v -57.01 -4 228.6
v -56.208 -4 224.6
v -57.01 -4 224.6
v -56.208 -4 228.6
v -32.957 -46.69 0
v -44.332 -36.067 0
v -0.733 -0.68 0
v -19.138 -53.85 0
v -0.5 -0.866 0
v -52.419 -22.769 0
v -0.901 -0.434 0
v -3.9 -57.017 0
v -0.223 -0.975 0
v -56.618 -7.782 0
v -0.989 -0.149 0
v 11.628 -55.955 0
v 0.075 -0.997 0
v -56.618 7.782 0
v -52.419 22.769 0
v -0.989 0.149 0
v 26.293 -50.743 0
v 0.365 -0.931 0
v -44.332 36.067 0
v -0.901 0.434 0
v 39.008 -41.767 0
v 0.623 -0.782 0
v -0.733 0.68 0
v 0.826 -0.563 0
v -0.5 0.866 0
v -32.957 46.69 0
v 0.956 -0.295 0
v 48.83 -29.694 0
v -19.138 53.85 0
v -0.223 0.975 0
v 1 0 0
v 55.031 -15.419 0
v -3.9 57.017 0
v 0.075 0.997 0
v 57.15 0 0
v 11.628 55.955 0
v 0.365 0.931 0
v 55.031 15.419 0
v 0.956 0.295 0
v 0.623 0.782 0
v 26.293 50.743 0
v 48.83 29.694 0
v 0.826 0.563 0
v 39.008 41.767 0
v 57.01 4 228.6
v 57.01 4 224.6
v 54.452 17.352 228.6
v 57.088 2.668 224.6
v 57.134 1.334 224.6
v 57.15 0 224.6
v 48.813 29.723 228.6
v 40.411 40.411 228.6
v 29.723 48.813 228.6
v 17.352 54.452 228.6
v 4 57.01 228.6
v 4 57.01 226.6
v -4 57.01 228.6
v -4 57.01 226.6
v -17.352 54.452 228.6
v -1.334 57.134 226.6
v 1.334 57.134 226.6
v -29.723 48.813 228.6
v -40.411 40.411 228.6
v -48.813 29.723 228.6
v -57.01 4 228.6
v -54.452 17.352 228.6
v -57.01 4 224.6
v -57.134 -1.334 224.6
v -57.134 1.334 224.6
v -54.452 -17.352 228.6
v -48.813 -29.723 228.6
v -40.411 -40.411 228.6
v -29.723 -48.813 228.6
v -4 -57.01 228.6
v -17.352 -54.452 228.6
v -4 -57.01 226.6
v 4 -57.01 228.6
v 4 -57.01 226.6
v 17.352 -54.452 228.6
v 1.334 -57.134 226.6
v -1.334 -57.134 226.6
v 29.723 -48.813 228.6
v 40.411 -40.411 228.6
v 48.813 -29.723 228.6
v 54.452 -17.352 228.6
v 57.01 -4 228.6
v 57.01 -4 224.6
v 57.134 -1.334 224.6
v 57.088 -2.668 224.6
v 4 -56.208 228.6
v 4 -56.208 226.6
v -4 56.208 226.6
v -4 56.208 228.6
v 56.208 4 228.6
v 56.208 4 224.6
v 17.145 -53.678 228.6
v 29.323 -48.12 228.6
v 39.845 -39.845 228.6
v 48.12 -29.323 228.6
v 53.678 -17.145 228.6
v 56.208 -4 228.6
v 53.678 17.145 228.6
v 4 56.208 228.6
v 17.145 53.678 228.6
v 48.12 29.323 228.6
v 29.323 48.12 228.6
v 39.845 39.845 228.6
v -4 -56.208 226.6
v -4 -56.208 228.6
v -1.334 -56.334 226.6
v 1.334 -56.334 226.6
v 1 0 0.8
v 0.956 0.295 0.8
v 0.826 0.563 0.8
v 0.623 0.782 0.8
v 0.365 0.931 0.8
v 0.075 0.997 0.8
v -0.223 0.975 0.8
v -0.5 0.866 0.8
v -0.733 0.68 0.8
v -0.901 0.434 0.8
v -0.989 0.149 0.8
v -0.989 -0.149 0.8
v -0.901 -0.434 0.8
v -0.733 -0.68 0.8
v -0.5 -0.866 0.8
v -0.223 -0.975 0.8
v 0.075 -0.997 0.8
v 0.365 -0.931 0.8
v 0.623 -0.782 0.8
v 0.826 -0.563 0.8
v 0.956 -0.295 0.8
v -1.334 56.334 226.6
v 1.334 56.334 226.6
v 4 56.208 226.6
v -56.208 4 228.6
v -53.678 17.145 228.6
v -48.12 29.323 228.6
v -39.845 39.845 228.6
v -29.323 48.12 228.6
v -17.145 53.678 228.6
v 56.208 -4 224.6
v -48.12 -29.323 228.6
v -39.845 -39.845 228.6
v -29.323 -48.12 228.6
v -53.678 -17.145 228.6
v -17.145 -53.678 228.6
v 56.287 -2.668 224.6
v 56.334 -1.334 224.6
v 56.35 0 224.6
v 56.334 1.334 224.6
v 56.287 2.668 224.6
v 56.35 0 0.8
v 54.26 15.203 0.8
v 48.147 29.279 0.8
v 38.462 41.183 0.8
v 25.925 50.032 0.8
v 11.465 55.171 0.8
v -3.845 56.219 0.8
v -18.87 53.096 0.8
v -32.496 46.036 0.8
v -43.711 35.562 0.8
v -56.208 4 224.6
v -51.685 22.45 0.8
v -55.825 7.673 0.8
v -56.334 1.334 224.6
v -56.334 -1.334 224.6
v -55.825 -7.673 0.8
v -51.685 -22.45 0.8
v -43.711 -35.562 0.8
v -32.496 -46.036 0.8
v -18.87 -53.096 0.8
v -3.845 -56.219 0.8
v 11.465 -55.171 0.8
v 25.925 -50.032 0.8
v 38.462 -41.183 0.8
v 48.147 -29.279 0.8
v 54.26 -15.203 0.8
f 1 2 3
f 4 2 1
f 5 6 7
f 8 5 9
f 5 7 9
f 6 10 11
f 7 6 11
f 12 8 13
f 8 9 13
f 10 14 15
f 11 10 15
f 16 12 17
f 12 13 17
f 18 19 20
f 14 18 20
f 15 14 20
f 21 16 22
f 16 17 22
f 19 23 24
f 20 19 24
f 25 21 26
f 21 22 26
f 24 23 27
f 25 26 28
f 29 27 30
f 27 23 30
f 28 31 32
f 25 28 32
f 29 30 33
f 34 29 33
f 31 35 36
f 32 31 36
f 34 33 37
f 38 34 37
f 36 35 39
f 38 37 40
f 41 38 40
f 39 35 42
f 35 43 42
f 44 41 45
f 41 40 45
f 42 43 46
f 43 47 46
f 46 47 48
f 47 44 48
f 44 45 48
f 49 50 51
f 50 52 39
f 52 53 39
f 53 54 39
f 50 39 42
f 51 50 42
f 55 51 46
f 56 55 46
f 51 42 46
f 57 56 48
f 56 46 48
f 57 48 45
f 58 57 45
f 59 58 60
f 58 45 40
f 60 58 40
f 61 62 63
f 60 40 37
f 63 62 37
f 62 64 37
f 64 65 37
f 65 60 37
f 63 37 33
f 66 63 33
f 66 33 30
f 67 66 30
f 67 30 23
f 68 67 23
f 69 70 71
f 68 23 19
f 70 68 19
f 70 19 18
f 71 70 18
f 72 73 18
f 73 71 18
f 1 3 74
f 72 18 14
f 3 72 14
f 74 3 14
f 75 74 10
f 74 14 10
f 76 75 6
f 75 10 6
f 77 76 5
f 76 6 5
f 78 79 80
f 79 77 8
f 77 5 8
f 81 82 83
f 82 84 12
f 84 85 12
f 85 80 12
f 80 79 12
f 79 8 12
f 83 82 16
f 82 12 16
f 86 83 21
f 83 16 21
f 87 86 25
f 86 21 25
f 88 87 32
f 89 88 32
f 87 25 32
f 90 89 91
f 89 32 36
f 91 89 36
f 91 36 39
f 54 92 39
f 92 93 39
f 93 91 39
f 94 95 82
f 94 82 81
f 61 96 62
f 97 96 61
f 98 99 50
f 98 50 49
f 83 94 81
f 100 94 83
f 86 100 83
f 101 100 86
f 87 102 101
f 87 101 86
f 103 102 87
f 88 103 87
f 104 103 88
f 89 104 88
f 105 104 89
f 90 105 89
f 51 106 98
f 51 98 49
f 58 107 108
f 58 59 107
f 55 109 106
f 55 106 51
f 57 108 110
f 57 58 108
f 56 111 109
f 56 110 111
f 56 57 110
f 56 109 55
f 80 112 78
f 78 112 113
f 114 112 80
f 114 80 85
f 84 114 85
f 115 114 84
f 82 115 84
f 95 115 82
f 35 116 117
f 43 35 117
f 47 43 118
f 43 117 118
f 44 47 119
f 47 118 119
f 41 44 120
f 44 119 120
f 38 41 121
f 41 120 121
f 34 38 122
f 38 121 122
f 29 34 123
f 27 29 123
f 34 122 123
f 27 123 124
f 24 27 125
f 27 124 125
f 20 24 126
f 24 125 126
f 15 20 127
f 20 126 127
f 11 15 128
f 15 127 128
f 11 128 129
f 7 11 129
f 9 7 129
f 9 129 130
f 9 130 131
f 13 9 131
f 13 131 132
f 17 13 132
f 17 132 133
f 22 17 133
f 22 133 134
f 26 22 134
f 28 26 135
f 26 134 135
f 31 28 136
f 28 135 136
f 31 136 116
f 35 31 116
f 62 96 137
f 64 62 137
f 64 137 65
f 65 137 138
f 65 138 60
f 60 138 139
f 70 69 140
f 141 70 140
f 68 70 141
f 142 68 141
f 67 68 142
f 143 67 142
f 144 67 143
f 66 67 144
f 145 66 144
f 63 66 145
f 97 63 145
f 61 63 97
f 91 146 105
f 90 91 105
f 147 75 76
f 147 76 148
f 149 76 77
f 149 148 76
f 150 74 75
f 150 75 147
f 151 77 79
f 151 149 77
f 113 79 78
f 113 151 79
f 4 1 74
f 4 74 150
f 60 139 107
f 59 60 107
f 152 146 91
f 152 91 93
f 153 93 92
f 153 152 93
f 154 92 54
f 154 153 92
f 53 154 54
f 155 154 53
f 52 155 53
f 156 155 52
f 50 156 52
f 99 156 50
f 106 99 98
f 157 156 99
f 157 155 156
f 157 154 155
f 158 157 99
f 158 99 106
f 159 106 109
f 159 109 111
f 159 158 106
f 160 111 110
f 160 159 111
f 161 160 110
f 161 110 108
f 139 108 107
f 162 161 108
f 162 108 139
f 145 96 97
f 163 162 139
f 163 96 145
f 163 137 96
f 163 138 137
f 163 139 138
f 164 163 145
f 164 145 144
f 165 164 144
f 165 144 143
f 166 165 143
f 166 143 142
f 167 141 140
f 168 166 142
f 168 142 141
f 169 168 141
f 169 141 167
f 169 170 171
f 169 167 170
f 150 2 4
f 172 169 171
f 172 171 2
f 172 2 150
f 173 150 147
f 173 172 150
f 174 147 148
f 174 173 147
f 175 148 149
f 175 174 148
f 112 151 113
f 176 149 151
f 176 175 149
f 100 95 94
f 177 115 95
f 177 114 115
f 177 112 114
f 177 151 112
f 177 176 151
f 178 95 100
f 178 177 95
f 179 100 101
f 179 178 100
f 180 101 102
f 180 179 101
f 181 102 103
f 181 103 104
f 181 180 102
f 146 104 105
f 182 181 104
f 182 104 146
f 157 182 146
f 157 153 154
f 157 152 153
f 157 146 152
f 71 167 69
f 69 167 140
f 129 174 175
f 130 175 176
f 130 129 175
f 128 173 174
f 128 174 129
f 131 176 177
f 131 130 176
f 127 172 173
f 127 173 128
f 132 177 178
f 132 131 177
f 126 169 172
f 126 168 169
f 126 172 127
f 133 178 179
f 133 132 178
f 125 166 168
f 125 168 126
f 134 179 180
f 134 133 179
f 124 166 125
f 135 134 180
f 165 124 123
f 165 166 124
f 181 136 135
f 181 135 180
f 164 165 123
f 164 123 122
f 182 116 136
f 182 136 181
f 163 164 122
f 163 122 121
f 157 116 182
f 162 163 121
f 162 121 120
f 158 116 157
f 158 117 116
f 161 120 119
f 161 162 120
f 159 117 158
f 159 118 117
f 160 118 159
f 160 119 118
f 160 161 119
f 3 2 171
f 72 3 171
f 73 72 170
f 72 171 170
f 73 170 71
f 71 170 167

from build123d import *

# Parameters (mm, degrees)
F0_R          = 57.15
F1_DEPTH      = 228.6
F2_T          = -0.8
F3_R          = 1
F4_DEPTH      = 0.8
F5_W          = 8
F5_H          = 2
F6_DEPTH      = 57.151
F6_DEPTH_BACK = 57.151
F7_W          = 8
F7_H          = 4
F8_DEPTH      = 57.151
F8_DEPTH_BACK = 57.151


with BuildPart() as f1:
    # F0 (on Top) → F1 (new body)
    with BuildSketch(Plane.XY):
        Circle(F0_R)
    extrude(amount=F1_DEPTH)

    # F2
    f2_openings = [f1.faces().sort_by_distance(p)[0] for p in [
        (0, 0, 228.6),
    ]]
    offset(amount=F2_T, openings=f2_openings)

    # F3 (on face) → F4 (cut, through all)
    with BuildSketch(Plane.XY.offset(0.8)):
        Circle(F3_R)
    extrude(amount=-F4_DEPTH, mode=Mode.SUBTRACT)

    # F5 (on Front) → F6 (cut, two sides)
    with BuildSketch(Plane.XZ) as f6_sk:
        with Locations((0, 227.6)):
            Rectangle(F5_W, F5_H)
    extrude(amount=-F6_DEPTH, mode=Mode.SUBTRACT)
    extrude(f6_sk.sketch, amount=F6_DEPTH_BACK, mode=Mode.SUBTRACT)

    # F7 (on Right) → F8 (cut, two sides)
    with BuildSketch(Plane.YZ) as f8_sk:
        with Locations((0, 226.6)):
            Rectangle(F7_W, F7_H)
    extrude(amount=-F8_DEPTH, mode=Mode.SUBTRACT)
    extrude(f8_sk.sketch, amount=F8_DEPTH_BACK, mode=Mode.SUBTRACT)


solid = f1.part
